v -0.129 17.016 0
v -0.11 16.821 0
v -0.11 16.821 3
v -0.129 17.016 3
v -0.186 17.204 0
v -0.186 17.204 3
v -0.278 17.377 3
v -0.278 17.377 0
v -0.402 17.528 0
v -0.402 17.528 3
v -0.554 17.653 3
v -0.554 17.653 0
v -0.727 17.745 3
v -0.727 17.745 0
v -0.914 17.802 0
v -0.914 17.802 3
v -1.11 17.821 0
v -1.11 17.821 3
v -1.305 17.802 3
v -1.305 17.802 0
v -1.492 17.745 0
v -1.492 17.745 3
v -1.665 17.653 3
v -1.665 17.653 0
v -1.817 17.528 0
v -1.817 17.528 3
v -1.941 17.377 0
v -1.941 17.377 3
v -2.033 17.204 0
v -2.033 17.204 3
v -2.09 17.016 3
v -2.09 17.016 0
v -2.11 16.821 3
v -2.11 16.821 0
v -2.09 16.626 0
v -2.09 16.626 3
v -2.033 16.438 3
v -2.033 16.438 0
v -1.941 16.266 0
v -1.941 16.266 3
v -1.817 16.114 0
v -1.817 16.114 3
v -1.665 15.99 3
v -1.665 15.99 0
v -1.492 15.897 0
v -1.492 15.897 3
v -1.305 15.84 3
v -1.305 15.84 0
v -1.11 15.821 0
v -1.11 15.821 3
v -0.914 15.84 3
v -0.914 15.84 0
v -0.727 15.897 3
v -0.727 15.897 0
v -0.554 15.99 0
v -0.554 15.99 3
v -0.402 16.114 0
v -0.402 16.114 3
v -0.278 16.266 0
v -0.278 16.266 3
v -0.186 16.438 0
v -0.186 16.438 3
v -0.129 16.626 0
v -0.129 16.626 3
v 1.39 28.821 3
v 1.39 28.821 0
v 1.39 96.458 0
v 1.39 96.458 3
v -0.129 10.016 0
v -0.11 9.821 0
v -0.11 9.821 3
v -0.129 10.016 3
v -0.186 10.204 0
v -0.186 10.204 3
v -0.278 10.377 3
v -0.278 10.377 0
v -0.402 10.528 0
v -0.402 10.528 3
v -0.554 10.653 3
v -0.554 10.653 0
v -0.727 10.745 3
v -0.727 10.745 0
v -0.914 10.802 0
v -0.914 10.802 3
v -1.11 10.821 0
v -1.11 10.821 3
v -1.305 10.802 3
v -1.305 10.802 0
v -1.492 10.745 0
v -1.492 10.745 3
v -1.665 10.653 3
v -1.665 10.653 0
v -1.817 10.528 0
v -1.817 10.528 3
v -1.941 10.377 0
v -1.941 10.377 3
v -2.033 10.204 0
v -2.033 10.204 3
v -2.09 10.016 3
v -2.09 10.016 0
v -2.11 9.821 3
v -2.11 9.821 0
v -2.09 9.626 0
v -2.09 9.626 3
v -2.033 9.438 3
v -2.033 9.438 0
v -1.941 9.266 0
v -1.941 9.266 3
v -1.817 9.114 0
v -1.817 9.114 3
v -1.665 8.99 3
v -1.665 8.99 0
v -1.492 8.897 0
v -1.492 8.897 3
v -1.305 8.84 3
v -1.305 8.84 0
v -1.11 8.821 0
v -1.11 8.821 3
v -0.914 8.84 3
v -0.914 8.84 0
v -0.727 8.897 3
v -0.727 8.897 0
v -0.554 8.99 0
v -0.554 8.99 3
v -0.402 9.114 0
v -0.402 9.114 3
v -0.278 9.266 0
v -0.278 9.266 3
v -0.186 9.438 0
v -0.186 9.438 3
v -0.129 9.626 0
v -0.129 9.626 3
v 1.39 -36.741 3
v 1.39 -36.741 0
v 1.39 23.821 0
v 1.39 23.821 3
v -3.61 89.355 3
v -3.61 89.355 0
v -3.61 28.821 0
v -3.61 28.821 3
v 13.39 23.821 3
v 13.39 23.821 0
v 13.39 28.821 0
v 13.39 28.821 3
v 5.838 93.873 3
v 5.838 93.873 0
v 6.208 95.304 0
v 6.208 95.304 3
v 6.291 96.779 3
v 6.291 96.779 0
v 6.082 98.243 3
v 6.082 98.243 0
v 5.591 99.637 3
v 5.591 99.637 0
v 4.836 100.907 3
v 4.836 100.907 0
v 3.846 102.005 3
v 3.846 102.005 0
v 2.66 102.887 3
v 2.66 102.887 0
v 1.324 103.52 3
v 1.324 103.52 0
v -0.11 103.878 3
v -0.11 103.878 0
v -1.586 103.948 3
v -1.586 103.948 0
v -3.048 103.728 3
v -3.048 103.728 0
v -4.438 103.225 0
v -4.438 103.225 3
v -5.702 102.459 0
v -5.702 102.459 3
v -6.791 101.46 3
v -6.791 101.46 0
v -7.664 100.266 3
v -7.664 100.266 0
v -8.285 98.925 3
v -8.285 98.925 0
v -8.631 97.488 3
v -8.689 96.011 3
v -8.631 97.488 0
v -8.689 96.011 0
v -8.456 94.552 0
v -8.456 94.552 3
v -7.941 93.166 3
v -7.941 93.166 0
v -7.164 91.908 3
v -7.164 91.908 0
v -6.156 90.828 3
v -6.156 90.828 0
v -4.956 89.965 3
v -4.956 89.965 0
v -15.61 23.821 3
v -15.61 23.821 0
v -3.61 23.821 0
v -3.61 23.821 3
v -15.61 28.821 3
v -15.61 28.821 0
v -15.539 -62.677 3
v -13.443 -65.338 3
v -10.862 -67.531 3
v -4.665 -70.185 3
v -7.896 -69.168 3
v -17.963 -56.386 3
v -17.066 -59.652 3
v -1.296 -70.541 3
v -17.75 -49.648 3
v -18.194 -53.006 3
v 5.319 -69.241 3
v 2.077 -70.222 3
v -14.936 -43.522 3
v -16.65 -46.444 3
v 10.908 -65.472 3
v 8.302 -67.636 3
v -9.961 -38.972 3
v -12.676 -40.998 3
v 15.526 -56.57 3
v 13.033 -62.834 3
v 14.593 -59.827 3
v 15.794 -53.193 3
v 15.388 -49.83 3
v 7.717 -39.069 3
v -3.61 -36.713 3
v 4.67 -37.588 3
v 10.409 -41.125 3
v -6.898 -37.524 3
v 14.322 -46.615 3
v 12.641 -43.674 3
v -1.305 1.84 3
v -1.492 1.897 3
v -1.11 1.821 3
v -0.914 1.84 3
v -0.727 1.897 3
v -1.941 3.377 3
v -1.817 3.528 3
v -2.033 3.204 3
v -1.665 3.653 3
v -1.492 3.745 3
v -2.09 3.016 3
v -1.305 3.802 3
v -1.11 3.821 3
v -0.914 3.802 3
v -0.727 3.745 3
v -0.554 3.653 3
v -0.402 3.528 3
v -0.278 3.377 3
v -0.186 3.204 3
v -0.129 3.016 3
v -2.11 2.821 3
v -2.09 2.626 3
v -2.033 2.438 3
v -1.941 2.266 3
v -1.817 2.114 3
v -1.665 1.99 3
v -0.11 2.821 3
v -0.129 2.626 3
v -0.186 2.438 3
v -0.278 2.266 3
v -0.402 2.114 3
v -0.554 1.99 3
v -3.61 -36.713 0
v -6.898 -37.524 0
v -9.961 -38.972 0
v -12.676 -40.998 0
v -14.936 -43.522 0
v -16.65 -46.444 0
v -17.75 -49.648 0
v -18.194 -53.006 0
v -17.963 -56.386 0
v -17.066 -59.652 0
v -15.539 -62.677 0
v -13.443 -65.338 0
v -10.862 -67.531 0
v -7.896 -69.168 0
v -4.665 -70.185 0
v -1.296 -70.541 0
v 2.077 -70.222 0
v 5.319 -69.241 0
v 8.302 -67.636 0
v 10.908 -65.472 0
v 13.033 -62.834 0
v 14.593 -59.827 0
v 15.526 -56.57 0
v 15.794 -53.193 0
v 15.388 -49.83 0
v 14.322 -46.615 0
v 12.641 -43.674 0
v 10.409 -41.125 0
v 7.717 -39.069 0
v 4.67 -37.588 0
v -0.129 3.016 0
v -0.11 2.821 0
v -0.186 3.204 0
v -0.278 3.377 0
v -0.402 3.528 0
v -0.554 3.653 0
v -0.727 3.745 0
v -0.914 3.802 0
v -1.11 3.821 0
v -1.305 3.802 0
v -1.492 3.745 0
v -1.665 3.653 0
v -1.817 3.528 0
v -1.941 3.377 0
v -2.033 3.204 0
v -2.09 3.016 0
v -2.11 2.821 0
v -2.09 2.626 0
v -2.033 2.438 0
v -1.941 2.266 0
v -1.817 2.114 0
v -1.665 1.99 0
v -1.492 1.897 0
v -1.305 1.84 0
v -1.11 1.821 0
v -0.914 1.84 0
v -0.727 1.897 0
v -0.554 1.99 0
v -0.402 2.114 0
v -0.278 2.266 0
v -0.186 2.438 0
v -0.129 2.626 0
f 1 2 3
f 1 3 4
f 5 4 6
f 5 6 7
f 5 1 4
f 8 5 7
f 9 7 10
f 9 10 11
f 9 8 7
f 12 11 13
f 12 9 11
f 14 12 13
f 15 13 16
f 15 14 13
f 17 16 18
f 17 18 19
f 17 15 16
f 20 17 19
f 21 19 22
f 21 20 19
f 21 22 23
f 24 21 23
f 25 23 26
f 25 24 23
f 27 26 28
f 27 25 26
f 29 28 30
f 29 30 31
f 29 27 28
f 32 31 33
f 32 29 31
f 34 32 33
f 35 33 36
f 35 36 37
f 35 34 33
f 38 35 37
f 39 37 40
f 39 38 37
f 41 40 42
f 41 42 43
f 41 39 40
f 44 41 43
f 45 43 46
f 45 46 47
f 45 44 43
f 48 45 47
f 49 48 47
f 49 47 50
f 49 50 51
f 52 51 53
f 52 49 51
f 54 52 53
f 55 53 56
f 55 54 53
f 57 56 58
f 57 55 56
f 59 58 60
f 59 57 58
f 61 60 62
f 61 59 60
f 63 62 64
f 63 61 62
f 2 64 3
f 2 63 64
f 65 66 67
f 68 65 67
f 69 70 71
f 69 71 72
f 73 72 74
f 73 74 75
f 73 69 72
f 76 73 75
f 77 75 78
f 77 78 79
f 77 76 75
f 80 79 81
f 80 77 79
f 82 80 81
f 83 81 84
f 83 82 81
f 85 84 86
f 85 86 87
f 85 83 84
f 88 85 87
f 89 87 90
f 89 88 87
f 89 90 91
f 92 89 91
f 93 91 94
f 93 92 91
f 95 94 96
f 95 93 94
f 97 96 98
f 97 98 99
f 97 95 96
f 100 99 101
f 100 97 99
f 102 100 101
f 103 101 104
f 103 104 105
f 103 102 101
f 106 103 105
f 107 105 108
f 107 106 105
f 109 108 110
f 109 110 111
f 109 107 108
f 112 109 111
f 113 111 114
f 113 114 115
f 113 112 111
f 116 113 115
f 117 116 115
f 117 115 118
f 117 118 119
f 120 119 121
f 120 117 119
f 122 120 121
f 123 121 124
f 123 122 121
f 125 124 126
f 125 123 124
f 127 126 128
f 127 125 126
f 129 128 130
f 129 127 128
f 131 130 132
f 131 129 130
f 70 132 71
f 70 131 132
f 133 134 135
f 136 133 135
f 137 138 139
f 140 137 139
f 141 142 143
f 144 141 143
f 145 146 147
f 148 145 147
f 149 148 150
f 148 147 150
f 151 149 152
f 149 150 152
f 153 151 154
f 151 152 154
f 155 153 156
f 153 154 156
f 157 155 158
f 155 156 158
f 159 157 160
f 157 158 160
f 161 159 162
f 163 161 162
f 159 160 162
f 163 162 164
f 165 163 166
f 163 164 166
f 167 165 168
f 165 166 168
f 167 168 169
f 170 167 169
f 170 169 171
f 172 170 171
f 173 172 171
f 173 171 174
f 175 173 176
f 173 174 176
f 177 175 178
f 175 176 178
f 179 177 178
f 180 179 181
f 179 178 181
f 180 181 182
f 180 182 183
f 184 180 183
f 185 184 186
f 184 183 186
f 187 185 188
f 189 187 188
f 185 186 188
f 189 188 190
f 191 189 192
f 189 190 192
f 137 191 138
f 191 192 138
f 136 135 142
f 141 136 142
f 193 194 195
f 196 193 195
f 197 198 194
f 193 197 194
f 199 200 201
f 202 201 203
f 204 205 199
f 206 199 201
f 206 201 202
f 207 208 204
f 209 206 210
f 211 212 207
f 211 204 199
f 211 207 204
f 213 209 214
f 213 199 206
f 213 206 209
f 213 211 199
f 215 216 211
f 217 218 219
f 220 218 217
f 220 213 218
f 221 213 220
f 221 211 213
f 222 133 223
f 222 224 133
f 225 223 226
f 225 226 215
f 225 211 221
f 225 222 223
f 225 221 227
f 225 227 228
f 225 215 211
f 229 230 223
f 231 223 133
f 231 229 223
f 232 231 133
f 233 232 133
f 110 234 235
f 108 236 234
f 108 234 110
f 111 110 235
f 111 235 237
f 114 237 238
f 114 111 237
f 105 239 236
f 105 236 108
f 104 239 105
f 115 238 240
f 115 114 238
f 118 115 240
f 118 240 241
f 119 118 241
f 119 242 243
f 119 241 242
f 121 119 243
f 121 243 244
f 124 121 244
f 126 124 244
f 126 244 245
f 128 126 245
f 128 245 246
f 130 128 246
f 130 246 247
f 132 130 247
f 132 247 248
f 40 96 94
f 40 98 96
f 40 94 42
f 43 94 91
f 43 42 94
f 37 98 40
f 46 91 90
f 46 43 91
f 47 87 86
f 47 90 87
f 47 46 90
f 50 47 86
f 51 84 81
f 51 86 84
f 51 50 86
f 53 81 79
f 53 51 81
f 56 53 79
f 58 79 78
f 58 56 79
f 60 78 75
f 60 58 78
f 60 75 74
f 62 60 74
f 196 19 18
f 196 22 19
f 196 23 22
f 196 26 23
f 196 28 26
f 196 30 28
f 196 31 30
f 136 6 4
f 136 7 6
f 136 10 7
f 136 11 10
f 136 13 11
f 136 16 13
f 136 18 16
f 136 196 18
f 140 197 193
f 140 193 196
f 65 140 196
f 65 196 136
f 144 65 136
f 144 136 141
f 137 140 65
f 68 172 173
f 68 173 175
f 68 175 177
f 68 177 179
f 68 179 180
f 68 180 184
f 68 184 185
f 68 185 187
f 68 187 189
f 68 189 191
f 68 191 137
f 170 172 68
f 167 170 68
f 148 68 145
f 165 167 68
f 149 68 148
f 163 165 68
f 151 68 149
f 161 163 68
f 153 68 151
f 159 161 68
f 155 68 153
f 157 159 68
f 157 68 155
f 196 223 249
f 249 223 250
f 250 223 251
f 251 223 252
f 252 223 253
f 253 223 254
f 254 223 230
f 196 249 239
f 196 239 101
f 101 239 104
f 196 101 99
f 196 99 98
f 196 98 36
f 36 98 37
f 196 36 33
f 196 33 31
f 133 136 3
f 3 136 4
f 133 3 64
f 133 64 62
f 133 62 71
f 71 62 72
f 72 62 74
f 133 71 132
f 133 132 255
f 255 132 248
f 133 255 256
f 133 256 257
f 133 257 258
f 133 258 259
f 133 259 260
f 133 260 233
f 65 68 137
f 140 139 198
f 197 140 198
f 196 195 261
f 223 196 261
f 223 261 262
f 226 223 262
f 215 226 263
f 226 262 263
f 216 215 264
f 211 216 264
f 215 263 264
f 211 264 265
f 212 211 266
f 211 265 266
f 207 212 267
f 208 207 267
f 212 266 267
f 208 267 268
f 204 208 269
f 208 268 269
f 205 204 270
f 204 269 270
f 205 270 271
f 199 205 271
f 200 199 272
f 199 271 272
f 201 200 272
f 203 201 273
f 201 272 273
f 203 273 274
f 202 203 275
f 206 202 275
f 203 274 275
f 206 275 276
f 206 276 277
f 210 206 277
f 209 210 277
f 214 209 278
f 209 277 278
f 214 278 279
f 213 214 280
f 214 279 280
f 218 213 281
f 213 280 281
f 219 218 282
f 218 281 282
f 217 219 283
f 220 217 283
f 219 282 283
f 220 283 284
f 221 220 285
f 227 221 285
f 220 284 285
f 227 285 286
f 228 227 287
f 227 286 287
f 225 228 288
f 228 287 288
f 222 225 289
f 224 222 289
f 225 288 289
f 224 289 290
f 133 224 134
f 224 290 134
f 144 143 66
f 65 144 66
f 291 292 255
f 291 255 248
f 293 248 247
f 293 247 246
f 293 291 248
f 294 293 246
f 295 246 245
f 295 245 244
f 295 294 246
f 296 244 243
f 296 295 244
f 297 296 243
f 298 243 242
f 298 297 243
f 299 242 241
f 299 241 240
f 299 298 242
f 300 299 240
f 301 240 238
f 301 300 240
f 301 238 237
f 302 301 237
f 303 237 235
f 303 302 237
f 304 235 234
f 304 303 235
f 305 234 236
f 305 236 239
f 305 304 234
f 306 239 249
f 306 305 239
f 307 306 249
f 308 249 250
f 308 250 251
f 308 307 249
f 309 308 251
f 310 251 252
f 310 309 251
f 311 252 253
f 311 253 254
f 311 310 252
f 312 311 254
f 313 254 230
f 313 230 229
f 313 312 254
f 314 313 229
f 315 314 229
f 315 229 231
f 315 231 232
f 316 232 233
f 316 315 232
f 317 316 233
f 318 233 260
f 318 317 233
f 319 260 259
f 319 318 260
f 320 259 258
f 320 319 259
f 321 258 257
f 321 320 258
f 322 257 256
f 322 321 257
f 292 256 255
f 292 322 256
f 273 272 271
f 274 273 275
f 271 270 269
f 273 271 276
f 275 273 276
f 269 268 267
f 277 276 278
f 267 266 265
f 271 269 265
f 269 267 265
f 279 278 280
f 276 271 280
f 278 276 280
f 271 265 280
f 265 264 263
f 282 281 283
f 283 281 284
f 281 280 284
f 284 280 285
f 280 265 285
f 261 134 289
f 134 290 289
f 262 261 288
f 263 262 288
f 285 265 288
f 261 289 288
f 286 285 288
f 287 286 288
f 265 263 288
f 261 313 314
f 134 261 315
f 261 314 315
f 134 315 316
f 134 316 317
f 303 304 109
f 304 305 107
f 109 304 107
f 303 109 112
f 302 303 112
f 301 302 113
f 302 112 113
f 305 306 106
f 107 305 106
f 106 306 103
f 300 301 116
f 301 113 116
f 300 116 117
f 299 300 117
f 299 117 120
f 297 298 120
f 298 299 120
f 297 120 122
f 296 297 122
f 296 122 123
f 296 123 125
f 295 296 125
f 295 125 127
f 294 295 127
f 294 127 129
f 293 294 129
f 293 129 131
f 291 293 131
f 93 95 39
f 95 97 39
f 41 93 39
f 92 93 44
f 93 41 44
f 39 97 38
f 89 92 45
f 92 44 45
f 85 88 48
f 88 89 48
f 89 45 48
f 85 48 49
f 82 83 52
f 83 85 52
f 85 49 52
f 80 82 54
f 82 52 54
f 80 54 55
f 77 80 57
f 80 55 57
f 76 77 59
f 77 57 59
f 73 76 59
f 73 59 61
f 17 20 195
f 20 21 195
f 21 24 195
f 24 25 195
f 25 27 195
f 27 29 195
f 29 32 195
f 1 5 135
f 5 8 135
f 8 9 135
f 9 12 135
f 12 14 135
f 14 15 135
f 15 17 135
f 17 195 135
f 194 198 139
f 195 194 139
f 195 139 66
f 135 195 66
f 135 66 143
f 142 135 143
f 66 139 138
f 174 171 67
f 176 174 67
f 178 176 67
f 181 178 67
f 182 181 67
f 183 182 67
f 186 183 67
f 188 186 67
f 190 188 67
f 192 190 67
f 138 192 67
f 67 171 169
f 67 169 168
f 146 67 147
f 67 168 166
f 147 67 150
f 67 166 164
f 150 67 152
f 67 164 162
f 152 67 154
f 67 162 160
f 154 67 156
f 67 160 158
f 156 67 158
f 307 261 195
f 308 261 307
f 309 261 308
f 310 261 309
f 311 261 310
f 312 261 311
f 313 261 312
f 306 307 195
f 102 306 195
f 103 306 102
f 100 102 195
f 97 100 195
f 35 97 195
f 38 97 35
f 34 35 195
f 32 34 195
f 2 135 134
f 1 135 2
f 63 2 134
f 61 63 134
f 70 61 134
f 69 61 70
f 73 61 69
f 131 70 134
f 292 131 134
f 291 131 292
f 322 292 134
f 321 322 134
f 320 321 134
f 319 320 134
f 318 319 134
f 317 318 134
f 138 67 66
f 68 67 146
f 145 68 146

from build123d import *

# Parameters (mm, degrees)
F0_R     = 1
F1_DEPTH = 3


with BuildPart() as f1:
    # F0 (on Top) → F1 (new body)
    with BuildSketch(Plane.XY):
        with BuildLine():
            Line((-3.609526, 23.8211), (-3.609526, -36.712977))
            ThreePointArc((-3.609526, -36.712977), (-1.295909, -70.541409), (1.390474, -36.740537))
            Line((1.390474, -36.740537), (1.390474, 23.8211))
            Line((1.390474, 23.8211), (13.390474, 23.8211))
            Line((13.390474, 23.8211), (13.390474, 28.8211))
            Line((13.390474, 28.8211), (1.390474, 28.8211))
            Line((1.390474, 28.8211), (1.390474, 89.420719))
            Line((1.390474, 89.420719), (1.390474, 96.458332))
            Line((1.390474, 96.458332), (5.837989, 93.872674))
            ThreePointArc((5.837989, 93.872674), (-4.437612, 103.224584), (-3.609526, 89.355177))
            Line((-3.609526, 89.355177), (-3.609526, 28.8211))
            Line((-3.609526, 28.8211), (-15.609526, 28.8211))
            Line((-15.609526, 28.8211), (-15.609526, 23.8211))
            Line((-15.609526, 23.8211), (-3.609526, 23.8211))
        make_face()
        with Locations((-1.109526, 2.8211)):
            Circle(F0_R, mode=Mode.SUBTRACT)
        with Locations((-1.109526, 9.8211)):
            Circle(F0_R, mode=Mode.SUBTRACT)
        with Locations((-1.109526, 16.8211)):
            Circle(F0_R, mode=Mode.SUBTRACT)
    extrude(amount=F1_DEPTH)


solid = f1.part
